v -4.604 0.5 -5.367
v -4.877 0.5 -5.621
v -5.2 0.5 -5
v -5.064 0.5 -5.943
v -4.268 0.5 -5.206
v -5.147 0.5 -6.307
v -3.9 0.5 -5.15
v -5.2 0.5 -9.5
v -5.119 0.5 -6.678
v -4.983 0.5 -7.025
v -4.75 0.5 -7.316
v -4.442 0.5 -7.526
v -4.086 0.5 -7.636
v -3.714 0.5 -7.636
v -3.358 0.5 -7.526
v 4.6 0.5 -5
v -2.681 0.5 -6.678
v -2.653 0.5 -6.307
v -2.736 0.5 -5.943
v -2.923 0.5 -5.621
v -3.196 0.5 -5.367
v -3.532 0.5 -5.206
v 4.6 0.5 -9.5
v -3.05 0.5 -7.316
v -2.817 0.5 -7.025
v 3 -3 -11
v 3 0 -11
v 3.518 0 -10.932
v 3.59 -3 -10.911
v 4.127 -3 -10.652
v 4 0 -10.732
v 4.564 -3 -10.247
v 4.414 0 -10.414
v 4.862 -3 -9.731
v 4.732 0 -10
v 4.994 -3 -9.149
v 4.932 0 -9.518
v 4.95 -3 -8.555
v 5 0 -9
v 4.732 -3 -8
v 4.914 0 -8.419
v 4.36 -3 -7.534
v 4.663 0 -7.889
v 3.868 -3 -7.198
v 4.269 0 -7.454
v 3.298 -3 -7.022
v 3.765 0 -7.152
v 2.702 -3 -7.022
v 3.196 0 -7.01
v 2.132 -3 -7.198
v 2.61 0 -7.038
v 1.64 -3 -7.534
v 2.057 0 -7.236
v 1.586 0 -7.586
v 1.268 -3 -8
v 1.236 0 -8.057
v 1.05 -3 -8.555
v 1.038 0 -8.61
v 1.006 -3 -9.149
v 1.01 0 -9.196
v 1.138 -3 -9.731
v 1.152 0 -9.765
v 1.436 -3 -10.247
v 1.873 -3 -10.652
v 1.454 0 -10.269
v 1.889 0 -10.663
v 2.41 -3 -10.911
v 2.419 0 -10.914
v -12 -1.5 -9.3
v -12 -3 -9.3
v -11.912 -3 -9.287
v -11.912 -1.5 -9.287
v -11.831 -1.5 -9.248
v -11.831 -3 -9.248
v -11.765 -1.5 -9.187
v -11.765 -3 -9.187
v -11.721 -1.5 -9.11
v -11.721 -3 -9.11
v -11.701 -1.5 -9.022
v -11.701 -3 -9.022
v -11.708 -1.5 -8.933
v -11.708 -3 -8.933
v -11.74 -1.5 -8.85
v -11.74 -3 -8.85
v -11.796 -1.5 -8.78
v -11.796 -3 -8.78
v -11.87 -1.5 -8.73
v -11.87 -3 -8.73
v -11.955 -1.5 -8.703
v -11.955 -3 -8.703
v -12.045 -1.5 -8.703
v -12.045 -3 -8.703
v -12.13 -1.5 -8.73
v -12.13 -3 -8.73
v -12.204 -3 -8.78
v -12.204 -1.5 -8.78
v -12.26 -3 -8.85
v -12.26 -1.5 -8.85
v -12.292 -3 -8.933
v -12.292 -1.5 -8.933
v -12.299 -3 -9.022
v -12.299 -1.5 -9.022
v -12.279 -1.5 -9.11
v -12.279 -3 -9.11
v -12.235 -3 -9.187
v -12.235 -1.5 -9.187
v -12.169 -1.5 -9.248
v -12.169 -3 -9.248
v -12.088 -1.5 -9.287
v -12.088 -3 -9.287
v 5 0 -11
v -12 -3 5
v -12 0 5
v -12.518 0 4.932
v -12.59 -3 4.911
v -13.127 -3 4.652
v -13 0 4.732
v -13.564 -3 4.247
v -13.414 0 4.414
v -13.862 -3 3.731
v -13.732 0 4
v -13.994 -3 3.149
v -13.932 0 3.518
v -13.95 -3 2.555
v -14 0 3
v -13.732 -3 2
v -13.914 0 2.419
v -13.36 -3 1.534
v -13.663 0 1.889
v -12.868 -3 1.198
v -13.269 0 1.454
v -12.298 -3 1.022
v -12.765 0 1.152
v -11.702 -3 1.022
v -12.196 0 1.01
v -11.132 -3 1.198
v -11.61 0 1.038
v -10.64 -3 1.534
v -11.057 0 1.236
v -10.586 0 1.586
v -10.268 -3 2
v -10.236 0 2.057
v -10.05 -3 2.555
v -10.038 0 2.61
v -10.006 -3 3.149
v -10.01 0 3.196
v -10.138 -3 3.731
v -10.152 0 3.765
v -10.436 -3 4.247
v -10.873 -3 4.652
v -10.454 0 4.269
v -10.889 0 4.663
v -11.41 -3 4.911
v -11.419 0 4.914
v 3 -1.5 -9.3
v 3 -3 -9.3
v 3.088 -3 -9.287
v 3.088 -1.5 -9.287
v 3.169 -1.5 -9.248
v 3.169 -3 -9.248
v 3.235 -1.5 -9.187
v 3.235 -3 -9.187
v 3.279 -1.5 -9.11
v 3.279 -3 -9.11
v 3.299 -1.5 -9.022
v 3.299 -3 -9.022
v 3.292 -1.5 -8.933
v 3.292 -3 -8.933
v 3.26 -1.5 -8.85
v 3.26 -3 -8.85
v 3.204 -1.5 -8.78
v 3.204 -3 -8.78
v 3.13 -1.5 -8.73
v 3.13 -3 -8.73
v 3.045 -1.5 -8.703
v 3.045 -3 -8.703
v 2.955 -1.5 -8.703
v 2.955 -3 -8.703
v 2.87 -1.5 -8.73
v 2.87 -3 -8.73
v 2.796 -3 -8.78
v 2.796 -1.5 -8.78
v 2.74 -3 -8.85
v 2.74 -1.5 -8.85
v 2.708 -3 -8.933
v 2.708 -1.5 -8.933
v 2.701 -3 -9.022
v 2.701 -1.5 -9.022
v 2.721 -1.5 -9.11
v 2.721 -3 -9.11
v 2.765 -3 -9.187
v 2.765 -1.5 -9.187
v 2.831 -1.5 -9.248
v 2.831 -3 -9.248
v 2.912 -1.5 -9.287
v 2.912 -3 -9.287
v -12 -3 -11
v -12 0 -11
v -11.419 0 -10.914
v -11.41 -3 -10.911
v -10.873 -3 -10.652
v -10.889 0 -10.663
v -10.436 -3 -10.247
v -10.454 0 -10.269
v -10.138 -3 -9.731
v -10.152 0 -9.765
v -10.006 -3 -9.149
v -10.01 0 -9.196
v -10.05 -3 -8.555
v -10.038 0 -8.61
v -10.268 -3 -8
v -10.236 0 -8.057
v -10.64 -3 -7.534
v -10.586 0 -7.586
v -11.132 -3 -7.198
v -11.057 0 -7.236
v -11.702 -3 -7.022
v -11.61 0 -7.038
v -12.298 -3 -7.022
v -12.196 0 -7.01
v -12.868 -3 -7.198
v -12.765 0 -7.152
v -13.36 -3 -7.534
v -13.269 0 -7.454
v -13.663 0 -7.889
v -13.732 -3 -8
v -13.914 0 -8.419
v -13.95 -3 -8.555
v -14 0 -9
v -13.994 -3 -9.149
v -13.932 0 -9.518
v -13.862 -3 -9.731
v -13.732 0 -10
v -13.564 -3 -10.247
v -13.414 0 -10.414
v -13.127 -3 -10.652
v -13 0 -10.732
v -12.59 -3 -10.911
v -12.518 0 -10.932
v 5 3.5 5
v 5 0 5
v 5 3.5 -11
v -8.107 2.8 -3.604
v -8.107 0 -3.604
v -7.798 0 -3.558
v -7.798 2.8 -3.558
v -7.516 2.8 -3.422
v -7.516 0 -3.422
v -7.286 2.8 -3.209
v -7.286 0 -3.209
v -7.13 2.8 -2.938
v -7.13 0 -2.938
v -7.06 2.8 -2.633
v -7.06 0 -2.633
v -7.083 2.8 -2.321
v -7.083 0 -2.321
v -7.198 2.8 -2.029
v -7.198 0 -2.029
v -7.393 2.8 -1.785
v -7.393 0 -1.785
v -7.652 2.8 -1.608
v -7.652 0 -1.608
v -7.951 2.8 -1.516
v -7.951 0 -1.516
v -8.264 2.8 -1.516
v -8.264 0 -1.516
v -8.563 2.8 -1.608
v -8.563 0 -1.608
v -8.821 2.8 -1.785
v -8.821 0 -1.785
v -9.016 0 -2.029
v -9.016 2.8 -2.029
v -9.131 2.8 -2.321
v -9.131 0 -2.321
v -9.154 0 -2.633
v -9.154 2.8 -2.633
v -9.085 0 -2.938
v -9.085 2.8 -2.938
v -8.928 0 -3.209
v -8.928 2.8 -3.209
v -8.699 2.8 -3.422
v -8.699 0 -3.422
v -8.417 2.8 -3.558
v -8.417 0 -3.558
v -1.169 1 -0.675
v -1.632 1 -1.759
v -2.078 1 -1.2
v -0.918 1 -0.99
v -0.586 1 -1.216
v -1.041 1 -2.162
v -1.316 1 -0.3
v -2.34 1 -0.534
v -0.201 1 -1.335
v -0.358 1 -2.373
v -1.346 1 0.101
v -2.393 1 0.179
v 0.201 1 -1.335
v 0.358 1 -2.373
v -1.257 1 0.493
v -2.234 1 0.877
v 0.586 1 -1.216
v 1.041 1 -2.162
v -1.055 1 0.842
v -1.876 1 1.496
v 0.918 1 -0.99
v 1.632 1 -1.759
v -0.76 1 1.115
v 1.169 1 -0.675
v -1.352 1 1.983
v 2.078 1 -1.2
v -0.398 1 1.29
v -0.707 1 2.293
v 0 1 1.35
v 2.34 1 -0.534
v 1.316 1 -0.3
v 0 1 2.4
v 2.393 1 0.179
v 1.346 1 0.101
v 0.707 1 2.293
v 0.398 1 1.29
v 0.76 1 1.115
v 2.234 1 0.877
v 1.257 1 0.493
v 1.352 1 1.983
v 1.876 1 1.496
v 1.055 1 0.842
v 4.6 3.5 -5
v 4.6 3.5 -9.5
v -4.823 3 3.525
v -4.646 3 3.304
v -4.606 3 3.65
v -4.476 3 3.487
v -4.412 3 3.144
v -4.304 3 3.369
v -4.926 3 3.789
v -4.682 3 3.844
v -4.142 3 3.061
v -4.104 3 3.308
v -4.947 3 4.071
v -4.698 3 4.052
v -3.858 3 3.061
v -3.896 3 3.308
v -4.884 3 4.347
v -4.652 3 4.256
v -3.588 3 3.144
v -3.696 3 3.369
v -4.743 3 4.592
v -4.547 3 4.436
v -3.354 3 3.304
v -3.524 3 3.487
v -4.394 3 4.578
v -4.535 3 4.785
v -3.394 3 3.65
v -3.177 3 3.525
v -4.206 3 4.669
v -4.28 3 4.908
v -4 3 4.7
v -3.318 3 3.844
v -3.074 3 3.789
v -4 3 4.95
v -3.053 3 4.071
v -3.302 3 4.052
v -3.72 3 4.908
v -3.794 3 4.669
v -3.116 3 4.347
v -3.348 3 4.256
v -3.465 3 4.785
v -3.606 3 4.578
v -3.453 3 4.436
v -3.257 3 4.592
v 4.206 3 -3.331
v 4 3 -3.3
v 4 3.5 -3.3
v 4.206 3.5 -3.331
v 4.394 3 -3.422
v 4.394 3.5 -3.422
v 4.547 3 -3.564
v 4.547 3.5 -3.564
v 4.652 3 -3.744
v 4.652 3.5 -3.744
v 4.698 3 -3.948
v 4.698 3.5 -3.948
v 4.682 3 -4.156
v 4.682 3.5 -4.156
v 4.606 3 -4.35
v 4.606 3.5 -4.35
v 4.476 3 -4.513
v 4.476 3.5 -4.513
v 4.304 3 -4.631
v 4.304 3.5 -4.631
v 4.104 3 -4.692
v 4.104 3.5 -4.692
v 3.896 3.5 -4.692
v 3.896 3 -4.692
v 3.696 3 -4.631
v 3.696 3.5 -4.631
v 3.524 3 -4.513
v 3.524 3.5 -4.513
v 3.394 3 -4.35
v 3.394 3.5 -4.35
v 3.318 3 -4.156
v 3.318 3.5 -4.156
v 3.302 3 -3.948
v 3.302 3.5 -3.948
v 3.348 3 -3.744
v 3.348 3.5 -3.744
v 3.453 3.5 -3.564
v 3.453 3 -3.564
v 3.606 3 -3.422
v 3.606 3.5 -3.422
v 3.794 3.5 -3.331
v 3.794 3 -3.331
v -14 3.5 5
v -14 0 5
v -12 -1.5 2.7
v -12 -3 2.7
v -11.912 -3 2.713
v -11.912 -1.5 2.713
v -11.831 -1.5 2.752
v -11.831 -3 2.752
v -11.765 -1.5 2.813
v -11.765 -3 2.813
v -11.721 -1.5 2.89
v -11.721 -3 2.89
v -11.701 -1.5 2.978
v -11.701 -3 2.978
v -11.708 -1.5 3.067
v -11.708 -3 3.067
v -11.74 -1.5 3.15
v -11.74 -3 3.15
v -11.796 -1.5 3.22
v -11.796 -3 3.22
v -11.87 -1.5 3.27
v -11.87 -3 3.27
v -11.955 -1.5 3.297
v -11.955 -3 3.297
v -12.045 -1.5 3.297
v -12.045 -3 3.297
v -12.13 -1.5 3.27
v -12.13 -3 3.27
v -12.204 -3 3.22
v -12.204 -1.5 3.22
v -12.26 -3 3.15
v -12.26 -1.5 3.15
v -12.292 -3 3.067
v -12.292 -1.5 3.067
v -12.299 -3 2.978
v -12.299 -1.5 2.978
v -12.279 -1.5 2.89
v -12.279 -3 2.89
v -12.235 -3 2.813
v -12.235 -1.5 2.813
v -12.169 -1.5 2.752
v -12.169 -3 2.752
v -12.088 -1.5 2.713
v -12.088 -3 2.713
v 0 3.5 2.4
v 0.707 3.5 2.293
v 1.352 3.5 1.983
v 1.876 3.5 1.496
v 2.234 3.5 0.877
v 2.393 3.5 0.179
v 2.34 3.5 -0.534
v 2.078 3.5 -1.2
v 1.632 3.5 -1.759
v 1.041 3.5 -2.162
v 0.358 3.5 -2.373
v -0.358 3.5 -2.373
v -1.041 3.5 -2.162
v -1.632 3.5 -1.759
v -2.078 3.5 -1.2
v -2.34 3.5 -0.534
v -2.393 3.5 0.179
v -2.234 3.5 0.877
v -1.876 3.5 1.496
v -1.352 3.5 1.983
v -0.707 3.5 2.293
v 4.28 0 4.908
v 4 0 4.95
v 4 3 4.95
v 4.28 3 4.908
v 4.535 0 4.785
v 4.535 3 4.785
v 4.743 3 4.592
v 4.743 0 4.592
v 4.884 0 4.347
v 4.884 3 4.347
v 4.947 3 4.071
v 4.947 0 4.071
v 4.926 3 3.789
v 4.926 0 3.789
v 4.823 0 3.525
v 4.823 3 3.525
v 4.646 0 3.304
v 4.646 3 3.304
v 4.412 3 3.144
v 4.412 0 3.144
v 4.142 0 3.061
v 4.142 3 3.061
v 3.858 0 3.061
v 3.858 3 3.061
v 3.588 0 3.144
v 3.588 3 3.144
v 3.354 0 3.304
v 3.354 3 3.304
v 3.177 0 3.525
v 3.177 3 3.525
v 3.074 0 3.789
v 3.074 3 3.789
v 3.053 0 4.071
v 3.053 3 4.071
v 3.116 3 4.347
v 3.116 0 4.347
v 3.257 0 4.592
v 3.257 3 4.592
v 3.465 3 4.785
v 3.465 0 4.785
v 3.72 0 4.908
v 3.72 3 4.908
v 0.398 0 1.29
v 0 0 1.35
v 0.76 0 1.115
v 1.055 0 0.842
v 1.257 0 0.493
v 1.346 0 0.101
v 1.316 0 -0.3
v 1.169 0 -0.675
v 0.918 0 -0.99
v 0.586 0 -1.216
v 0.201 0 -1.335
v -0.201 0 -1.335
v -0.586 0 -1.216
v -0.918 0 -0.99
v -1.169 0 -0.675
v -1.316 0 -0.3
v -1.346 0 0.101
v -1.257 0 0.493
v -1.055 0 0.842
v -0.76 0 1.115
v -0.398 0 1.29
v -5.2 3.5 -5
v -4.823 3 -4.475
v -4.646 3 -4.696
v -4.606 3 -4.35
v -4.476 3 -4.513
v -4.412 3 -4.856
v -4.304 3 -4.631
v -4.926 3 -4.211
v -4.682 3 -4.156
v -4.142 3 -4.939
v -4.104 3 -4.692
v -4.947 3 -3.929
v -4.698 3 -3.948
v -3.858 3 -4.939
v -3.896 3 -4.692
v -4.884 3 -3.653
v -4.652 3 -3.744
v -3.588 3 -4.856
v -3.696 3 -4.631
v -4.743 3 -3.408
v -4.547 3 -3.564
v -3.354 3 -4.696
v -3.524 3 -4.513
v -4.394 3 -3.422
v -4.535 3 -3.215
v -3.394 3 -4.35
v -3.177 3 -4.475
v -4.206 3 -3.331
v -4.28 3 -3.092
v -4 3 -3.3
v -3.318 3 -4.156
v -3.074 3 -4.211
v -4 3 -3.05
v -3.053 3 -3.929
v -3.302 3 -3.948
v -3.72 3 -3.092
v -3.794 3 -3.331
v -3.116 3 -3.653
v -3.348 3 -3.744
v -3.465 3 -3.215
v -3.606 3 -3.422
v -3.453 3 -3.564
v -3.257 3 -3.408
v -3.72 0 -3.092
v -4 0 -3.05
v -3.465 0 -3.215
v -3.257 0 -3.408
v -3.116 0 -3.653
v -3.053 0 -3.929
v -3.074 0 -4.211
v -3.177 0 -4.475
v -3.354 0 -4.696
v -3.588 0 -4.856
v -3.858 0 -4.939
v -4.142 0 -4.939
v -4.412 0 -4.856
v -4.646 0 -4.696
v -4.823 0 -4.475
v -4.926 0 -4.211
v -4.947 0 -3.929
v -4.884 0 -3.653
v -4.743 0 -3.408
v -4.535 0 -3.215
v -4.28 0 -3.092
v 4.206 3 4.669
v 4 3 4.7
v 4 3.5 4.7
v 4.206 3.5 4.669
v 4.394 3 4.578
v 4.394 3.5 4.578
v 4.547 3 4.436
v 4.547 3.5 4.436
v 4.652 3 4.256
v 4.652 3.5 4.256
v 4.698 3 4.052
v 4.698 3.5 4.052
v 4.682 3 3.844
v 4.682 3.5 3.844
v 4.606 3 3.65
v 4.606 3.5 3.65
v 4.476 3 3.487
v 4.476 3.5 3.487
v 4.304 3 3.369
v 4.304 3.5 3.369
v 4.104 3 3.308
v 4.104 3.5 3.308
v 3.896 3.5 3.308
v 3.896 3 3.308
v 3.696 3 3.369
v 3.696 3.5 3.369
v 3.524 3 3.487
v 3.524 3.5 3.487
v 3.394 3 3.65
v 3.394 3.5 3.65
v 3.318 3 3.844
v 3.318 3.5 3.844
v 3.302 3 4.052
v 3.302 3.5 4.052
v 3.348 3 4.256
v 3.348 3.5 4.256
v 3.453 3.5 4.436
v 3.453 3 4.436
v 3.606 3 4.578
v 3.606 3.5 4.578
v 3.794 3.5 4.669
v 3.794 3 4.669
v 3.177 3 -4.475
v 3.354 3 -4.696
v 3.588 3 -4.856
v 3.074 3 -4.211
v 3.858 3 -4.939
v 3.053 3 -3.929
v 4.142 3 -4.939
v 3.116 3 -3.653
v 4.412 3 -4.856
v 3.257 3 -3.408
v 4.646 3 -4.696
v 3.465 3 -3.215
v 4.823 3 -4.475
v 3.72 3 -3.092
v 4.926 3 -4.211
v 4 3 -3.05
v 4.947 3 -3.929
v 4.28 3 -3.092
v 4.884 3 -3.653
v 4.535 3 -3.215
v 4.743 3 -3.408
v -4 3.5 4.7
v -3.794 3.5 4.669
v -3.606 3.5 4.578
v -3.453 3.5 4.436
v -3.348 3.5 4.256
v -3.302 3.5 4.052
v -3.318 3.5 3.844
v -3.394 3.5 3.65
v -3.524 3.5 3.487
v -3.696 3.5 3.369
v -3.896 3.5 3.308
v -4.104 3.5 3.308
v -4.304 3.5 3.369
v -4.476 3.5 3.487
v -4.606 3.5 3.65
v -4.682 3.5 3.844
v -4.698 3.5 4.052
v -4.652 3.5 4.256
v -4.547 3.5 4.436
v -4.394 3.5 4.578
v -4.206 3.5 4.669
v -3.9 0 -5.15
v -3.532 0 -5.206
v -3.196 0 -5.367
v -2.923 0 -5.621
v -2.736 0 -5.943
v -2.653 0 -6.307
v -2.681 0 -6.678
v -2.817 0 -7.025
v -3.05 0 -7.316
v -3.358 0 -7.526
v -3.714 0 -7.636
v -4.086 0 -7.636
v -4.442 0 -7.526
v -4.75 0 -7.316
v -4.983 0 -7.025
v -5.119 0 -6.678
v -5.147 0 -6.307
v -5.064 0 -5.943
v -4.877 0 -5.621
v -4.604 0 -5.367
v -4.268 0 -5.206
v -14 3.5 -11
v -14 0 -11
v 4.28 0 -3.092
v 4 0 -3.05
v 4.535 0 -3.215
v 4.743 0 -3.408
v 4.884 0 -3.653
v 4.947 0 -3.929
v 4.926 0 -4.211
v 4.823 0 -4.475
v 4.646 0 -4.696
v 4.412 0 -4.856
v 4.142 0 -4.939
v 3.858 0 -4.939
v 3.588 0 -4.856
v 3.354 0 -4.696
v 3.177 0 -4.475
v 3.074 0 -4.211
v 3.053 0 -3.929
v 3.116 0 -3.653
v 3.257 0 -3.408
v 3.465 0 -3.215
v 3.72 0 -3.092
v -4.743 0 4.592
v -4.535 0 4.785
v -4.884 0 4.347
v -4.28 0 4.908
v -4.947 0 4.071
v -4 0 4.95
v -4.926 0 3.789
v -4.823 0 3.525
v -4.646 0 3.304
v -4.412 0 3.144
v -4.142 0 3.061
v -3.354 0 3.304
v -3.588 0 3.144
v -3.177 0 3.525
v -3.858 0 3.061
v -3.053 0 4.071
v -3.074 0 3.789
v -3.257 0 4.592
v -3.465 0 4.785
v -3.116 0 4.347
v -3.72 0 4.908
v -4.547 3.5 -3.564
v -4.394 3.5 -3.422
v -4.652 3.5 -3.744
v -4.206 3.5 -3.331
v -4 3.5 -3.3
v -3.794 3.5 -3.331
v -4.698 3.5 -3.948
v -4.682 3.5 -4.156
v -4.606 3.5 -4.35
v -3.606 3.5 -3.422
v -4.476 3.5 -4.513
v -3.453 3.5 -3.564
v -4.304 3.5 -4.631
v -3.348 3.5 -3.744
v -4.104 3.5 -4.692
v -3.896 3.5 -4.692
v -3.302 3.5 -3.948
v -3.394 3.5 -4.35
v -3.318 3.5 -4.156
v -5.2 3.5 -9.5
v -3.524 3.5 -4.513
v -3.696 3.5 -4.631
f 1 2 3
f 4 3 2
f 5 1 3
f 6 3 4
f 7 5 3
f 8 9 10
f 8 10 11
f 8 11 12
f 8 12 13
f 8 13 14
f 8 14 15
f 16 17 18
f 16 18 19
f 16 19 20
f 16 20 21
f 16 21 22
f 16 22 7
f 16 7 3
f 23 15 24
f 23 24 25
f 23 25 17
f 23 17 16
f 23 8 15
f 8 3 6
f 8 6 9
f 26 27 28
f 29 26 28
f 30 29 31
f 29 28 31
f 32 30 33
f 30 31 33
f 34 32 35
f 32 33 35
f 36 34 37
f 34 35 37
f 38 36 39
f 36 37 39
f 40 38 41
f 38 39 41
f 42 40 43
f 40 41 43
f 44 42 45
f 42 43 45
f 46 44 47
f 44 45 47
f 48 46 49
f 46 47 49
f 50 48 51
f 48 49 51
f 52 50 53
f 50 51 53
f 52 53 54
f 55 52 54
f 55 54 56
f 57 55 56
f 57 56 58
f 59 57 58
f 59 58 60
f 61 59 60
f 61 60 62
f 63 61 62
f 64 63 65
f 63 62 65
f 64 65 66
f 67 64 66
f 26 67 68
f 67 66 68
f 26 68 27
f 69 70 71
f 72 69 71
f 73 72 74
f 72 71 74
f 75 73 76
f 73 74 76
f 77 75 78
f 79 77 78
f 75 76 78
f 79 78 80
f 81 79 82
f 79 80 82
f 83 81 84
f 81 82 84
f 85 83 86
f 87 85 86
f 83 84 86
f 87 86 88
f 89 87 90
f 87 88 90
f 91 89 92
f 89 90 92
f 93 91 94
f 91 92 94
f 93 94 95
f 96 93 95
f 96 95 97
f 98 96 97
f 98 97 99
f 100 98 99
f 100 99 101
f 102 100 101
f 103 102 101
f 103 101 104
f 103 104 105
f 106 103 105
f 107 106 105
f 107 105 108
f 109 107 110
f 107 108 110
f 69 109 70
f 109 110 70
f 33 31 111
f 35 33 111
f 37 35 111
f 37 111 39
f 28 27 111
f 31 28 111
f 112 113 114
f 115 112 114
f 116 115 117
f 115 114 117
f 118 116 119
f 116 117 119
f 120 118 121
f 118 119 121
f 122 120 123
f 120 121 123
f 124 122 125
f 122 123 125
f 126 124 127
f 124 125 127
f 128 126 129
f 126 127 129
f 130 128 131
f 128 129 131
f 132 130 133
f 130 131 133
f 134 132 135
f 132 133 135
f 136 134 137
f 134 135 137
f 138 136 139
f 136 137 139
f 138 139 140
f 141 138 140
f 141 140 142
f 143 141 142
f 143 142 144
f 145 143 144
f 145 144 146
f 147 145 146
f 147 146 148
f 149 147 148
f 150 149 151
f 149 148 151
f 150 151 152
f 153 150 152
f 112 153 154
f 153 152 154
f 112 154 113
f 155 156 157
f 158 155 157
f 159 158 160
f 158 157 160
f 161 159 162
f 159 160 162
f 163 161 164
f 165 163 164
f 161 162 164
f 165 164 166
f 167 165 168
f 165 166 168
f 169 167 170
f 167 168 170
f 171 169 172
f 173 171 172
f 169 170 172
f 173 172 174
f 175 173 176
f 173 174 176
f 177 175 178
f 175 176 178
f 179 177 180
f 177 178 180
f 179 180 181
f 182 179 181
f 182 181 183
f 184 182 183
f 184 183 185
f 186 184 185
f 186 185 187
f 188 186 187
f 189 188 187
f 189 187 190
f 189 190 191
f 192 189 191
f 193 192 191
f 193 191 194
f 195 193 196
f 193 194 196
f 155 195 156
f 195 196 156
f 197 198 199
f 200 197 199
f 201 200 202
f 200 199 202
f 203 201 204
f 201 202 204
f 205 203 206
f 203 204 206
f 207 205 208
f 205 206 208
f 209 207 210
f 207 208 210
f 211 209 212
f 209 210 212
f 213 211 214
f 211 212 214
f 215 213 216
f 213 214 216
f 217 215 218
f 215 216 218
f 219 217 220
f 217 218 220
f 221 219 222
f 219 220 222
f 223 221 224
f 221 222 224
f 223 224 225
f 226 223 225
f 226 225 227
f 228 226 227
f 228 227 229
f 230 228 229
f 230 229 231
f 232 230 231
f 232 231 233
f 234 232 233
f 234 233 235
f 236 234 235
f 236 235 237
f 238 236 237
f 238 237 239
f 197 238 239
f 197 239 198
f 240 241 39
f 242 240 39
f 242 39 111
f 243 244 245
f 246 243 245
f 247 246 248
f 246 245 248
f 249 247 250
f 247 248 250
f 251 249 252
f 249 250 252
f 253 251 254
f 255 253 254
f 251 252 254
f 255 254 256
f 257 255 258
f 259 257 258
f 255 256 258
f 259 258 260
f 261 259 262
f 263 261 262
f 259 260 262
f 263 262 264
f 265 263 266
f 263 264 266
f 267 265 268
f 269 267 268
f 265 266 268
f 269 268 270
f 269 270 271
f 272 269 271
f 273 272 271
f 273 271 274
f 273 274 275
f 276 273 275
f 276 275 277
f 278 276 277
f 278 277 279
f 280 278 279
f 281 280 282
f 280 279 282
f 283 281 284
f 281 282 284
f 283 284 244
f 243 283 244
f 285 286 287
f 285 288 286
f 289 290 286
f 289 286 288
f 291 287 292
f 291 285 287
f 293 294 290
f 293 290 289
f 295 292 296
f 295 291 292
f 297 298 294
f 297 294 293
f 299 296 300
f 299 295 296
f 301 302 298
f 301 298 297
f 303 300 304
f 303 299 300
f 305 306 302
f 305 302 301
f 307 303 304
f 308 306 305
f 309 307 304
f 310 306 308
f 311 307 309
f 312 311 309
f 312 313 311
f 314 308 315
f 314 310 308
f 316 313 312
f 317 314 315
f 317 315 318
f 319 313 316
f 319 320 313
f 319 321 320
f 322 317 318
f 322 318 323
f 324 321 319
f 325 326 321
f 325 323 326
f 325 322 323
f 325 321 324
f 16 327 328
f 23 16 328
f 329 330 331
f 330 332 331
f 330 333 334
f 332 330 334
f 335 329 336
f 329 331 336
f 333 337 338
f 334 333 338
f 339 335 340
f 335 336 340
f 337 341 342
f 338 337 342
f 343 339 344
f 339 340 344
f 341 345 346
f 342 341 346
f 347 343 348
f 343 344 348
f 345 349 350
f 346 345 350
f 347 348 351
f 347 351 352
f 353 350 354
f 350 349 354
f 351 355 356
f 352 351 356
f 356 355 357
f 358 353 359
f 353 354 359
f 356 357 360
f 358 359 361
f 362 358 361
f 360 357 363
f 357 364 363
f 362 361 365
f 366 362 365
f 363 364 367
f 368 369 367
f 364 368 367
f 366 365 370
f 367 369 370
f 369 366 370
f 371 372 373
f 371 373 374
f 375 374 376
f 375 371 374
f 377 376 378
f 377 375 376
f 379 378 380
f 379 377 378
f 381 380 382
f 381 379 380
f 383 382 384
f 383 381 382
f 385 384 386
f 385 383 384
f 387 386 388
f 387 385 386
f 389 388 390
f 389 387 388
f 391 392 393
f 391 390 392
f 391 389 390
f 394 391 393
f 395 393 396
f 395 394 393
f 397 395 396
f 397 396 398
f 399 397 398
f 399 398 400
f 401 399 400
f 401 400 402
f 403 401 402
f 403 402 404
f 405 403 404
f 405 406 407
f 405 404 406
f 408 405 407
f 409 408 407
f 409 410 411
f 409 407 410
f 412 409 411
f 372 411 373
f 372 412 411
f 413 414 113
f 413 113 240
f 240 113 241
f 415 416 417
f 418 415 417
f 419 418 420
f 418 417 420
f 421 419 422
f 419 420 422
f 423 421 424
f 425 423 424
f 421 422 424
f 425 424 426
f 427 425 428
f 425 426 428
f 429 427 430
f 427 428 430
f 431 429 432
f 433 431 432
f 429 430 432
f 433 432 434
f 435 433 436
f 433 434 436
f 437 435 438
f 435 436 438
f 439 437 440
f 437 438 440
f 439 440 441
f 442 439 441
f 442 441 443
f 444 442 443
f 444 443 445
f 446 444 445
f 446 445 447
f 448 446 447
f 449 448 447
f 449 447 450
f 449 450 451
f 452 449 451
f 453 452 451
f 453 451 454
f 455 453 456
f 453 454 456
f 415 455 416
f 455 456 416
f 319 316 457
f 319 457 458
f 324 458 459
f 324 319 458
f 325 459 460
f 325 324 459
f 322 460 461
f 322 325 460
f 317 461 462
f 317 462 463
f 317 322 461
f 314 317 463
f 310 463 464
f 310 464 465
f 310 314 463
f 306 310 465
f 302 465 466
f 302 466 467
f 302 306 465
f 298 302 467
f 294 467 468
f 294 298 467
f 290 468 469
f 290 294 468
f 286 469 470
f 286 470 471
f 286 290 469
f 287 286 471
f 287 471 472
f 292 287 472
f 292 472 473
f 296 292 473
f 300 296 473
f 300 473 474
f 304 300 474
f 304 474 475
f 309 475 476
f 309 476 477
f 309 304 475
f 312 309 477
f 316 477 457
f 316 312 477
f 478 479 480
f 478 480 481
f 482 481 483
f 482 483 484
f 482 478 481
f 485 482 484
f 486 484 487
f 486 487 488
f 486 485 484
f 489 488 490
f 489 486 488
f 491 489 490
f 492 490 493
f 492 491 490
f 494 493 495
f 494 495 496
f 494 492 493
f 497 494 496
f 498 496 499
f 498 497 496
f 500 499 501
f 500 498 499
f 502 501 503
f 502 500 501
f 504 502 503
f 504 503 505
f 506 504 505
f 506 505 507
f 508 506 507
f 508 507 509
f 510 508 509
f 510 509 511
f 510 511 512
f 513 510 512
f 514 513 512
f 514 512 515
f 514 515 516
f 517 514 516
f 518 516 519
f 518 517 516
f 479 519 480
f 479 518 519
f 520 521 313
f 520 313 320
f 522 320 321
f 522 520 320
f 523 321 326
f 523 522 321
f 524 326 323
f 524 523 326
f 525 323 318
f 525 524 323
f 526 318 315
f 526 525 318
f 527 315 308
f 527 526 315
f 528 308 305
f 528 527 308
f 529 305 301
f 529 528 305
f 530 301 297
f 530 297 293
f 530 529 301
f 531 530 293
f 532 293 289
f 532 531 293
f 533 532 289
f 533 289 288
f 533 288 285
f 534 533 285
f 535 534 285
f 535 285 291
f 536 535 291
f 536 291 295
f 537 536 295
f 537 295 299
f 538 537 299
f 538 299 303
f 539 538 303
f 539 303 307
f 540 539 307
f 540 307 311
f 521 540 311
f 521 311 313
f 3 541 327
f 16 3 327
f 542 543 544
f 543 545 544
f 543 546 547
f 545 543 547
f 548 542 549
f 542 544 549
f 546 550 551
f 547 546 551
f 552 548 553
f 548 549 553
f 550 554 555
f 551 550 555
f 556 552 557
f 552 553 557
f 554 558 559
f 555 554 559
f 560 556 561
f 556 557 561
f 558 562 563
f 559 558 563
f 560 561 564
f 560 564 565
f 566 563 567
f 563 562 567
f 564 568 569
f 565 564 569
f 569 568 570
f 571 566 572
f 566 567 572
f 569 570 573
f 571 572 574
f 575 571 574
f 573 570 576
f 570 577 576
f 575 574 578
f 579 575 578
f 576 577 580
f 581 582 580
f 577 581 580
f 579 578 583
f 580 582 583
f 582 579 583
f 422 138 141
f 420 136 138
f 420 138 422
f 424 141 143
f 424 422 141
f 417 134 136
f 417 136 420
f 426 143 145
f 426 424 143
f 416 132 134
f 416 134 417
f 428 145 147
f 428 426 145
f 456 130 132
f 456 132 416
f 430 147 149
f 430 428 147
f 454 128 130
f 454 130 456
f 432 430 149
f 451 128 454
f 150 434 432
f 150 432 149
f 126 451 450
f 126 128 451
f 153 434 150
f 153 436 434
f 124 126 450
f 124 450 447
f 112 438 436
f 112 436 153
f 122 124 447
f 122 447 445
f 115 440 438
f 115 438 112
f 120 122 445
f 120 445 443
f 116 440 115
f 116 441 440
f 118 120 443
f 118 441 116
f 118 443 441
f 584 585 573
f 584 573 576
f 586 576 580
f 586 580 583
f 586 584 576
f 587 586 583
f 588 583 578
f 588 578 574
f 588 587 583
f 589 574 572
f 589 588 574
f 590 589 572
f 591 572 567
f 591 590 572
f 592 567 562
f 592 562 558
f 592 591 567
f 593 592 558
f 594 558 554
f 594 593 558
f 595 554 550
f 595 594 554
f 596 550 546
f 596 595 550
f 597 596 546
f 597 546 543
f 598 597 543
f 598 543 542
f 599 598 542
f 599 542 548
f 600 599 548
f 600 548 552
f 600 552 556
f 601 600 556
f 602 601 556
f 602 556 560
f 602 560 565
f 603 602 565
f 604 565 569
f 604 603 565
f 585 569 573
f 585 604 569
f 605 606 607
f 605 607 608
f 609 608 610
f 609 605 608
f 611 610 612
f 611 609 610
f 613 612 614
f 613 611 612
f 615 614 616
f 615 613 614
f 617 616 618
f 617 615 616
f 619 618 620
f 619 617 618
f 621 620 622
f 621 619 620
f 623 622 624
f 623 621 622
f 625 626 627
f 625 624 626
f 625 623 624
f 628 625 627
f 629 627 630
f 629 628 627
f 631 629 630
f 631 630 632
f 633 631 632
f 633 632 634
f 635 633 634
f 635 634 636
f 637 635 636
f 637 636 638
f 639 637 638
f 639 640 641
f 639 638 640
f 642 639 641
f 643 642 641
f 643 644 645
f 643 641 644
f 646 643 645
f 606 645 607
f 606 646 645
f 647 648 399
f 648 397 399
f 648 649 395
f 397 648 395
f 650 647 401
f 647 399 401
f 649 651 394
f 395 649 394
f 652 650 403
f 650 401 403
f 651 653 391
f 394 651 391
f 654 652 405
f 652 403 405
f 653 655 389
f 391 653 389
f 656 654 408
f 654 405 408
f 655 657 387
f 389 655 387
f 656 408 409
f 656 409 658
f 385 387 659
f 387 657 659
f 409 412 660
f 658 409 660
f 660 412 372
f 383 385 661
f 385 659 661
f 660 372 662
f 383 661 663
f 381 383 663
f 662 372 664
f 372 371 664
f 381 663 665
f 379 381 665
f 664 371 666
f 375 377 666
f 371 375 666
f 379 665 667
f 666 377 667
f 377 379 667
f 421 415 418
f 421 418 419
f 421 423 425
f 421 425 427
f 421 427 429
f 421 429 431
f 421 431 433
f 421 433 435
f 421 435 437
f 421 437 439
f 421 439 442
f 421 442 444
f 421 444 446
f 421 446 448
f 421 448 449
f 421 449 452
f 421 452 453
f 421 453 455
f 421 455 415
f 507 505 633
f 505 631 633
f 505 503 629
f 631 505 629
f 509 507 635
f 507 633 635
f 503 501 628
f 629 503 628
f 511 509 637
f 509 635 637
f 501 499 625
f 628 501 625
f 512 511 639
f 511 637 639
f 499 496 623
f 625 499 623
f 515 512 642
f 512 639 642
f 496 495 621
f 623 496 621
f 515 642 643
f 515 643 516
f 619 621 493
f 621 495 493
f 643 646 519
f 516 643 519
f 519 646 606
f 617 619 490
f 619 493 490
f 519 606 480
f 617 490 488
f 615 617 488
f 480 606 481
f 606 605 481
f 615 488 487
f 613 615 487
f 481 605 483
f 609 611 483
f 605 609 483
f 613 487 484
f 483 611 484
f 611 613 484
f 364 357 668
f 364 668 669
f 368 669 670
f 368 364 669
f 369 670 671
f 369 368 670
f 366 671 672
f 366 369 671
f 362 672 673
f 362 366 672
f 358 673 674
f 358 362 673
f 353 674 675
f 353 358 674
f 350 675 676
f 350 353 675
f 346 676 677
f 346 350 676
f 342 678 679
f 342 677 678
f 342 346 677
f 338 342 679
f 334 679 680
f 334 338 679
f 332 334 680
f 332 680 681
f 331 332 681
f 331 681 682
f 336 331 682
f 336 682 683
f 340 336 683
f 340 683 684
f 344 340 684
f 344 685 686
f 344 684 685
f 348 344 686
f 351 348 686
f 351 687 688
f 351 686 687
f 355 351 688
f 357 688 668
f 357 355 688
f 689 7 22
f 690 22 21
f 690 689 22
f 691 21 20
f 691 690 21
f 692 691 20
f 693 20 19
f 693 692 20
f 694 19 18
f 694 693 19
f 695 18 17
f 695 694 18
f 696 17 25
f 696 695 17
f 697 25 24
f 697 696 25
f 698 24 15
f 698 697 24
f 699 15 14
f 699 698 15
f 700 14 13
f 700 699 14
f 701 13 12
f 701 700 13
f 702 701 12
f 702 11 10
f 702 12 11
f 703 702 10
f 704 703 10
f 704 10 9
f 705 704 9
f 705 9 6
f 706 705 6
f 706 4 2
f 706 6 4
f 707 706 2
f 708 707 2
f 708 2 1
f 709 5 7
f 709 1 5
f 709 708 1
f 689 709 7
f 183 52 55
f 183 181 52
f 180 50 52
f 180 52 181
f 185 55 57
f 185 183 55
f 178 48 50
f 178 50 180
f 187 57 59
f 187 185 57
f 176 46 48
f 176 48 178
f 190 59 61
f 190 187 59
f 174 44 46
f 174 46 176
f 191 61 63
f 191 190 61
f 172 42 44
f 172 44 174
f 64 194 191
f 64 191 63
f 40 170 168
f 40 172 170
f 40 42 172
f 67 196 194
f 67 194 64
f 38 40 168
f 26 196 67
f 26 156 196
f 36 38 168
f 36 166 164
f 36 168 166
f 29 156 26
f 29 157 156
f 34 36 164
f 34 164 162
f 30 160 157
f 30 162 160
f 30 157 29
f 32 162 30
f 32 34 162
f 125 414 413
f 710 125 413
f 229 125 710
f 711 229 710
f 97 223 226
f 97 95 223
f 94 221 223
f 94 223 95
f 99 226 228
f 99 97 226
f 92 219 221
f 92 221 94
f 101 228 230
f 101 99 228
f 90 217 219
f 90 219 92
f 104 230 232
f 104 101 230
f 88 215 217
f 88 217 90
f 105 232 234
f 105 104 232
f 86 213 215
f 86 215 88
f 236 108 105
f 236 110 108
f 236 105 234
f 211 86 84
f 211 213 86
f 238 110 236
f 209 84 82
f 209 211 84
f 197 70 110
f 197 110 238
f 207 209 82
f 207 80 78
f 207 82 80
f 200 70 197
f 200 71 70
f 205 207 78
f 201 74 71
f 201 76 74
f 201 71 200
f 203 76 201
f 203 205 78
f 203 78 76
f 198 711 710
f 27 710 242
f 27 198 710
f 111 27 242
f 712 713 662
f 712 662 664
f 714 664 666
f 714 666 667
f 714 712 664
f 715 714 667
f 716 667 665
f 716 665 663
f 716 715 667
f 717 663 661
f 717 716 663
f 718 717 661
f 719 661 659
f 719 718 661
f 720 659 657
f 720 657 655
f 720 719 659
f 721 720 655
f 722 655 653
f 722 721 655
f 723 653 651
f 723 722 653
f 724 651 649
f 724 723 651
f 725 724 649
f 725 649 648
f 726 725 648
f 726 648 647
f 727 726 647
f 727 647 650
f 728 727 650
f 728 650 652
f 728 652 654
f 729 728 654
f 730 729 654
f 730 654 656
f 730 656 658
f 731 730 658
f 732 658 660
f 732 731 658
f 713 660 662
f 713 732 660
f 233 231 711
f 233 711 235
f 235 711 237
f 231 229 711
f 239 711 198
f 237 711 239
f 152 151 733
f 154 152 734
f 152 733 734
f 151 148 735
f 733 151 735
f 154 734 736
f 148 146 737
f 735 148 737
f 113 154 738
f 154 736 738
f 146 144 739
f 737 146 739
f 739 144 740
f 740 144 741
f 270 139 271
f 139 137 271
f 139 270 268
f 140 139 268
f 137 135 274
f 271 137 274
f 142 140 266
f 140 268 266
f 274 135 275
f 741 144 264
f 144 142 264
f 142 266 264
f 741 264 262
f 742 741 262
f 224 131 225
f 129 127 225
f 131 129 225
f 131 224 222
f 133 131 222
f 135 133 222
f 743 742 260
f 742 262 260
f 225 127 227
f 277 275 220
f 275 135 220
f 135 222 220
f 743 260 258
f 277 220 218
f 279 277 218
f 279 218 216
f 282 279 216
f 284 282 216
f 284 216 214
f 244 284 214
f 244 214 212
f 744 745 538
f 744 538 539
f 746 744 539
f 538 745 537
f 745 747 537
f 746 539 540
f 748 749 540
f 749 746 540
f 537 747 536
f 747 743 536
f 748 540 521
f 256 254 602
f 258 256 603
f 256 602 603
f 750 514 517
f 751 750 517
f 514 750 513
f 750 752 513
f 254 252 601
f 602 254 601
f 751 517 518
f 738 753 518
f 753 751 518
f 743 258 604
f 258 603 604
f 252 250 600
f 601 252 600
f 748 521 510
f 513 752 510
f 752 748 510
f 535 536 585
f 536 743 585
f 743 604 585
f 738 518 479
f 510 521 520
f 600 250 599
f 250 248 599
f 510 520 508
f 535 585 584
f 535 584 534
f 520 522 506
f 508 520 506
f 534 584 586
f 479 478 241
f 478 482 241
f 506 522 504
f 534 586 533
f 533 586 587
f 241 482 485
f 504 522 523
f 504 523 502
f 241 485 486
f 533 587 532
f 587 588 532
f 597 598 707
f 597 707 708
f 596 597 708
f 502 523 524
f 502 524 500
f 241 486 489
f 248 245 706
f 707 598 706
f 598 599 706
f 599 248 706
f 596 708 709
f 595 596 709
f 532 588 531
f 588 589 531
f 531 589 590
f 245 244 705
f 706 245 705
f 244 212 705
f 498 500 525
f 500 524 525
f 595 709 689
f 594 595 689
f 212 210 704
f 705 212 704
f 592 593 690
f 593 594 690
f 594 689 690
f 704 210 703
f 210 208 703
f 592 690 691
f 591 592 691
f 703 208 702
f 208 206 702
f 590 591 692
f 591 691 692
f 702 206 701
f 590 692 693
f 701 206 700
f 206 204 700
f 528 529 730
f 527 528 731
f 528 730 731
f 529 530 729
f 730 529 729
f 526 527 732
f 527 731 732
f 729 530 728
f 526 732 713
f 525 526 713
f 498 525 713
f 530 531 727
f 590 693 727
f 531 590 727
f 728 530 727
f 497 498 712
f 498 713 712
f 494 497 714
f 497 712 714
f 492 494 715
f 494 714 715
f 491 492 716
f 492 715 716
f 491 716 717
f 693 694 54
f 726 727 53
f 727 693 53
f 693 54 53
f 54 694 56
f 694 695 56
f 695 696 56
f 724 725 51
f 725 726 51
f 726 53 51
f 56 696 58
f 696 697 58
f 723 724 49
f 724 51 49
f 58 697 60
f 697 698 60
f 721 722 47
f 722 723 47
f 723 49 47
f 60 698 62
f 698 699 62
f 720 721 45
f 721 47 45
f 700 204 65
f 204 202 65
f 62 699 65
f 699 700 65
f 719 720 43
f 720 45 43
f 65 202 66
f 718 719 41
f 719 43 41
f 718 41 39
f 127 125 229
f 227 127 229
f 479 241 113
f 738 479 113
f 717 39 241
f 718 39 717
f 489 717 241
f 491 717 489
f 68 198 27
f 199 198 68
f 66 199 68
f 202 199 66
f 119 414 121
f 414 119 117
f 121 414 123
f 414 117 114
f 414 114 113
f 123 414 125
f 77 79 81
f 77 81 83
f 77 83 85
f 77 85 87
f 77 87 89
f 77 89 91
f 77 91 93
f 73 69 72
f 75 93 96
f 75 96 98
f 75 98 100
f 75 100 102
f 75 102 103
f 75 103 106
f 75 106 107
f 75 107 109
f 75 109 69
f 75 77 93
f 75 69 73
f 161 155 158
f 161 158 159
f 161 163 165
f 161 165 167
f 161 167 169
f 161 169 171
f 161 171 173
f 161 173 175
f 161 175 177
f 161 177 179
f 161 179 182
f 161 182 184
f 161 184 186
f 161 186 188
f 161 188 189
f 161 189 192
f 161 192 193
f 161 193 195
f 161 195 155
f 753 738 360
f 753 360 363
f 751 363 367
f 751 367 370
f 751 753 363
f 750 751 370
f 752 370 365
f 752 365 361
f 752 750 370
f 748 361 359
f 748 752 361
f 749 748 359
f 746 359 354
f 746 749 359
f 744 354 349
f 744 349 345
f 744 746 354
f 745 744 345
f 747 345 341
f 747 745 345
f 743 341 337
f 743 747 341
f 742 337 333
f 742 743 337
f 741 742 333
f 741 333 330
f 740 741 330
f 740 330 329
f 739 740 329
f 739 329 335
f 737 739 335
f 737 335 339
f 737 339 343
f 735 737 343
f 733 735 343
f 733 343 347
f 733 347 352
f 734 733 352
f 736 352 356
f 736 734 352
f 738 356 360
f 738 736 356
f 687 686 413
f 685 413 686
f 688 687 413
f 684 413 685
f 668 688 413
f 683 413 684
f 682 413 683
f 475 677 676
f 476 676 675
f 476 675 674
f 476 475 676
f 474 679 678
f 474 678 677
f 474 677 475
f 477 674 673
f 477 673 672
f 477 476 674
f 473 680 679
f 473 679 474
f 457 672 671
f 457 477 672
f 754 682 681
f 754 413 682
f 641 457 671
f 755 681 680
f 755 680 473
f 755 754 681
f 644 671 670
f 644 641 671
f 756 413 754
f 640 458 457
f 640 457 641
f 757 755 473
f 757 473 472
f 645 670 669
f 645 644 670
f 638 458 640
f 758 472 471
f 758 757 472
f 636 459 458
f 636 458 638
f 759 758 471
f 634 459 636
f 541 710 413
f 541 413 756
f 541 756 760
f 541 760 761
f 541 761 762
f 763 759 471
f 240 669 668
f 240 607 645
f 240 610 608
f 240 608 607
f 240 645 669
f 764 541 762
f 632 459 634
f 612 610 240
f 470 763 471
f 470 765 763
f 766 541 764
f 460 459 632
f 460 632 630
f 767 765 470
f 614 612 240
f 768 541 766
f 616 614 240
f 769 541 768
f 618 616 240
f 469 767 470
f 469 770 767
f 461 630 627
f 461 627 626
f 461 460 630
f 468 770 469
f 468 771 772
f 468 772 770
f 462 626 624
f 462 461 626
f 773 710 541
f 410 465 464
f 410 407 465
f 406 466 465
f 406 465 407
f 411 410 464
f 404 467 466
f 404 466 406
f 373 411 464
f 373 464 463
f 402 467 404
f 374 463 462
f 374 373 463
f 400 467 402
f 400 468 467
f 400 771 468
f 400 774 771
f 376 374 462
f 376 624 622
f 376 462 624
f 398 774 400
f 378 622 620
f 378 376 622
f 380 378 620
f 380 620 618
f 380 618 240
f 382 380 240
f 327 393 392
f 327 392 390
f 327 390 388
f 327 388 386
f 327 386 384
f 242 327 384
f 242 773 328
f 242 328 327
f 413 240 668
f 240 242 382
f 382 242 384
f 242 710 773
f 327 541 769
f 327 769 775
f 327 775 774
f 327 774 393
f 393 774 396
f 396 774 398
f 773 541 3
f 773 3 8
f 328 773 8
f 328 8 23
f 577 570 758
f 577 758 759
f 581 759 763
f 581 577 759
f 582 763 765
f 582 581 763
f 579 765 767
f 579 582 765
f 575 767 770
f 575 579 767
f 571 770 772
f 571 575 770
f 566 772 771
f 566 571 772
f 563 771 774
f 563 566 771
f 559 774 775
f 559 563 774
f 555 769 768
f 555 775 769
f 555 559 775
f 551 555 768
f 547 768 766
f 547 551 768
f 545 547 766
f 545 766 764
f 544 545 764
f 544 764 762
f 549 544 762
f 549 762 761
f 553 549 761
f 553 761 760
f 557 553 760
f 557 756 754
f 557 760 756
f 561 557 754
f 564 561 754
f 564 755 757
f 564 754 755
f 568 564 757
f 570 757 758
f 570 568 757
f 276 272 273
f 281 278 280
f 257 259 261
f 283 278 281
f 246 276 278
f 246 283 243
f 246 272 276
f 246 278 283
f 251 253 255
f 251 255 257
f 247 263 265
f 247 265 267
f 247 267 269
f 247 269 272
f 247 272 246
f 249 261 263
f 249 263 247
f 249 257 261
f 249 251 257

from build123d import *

# Parameters (mm, degrees)
SKETCH_1_W          = 19
SKETCH_1_H          = 16
EXTRUDE_1_DEPTH     = 3.5
SKETCH_1_3_R        = 1.35
CUT_EXTRUDE_1_DEPTH = 19.145247312
CUT_EXTRUDE_START   = 1
SKETCH_1_4_R        = 2.4
SKETCH_1_4_R_2      = 1.35
CUT_EXTRUDE_2_DEPTH = 2.5
SKETCH_1_7_R        = 0.7
CUT_EXTRUDE_3_DEPTH = 19.145247312
SKETCH_1_18_R       = 0.95
CUT_EXTRUDE_8_DEPTH = 3
SKETCH_1_17_R       = 1.25
CUT_EXTRUDE_4_DEPTH = 19.145247312
SKETCH_2_W          = 9.8
SKETCH_2_H          = 4.5
CUT_EXTRUDE_5_DEPTH = 3
SKETCH_4_R          = 1.05
CUT_EXTRUDE_6_DEPTH = 2.8
SKETCH_5_R          = 2
EXTRUDE_2_DEPTH     = 3
CUT_EXTRUDE_START_2 = 3
SKETCH_5_3_R        = 0.3
CUT_EXTRUDE_7_DEPTH = 1.5


with BuildPart() as part:
    # 草图1 → 凸台-拉伸1 (new body)
    with BuildSketch(Plane(origin=(0, 0, 0), x_dir=(1, 0, 0), z_dir=(0, 1, 0))):
        with Locations((-4.5, 3)):
            Rectangle(SKETCH_1_W, SKETCH_1_H)
    extrude(amount=EXTRUDE_1_DEPTH)

    # 草图1<3> → 切除-拉伸1 (cut, through all)
    with BuildSketch(Plane(origin=(0, 0, 0), x_dir=(1, 0, 0), z_dir=(0, 1, 0))):
        with Locations(Location((0, 0, 0), (0, 0, 270))):
            Circle(SKETCH_1_3_R)
    extrude(amount=CUT_EXTRUDE_1_DEPTH, mode=Mode.SUBTRACT)

    # 草图1<4> → 切除-拉伸2 (cut)
    with BuildSketch(Plane(origin=(0, 0, 0), x_dir=(1, 0, 0), z_dir=(0, 1, 0)).offset(CUT_EXTRUDE_START)):
        with Locations(Location((0, 0, 0), (0, 0, 270))):
            Circle(SKETCH_1_4_R)
        with Locations(Location((0, 0, 0), (0, 0, 270))):
            Circle(SKETCH_1_4_R_2, mode=Mode.SUBTRACT)
    extrude(amount=CUT_EXTRUDE_2_DEPTH, mode=Mode.SUBTRACT)

    # 草图1<7> → 切除-拉伸3 (cut, through all)
    with BuildSketch(Plane(origin=(0, 0, 0), x_dir=(1, 0, 0), z_dir=(0, 1, 0))):
        with Locations(Location((4, 4, 0), (0, 0, 270))):
            Circle(SKETCH_1_7_R)
        with Locations(Location((-4, -4, 0), (0, 0, 270))):
            Circle(SKETCH_1_7_R)
        with Locations(Location((-4, 4, 0), (0, 0, 270))):
            Circle(SKETCH_1_7_R)
        with Locations(Location((4, -4, 0), (0, 0, 270))):
            Circle(SKETCH_1_7_R)
    extrude(amount=CUT_EXTRUDE_3_DEPTH, mode=Mode.SUBTRACT)

    # 草图1<18> → 切除-拉伸8 (cut)
    with BuildSketch(Plane(origin=(0, 0, 0), x_dir=(1, 0, 0), z_dir=(0, 1, 0))):
        with Locations(Location((4, 4, 0), (0, 0, 270))):
            Circle(SKETCH_1_18_R)
        with Locations(Location((-4, -4, 0), (0, 0, 270))):
            Circle(SKETCH_1_18_R)
        with Locations(Location((-4, 4, 0), (0, 0, 270))):
            Circle(SKETCH_1_18_R)
        with Locations(Location((4, -4, 0), (0, 0, 270))):
            Circle(SKETCH_1_18_R)
    extrude(amount=CUT_EXTRUDE_8_DEPTH, mode=Mode.SUBTRACT)

    # 草图1<17> → 切除-拉伸4 (cut, through all)
    with BuildSketch(Plane(origin=(0, 0, 0), x_dir=(1, 0, 0), z_dir=(0, 1, 0))):
        with Locations(Location((-3.9, 6.4, 0), (0, 0, 270))):
            Circle(SKETCH_1_17_R)
    extrude(amount=CUT_EXTRUDE_4_DEPTH, mode=Mode.SUBTRACT)

    # 草图2 → 切除-拉伸5 (cut)
    with BuildSketch(Plane(origin=(0, 3.5, 0), x_dir=(1, 0, 0), z_dir=(0, 1, 0))):
        with Locations((-0.3, 7.25)):
            Rectangle(SKETCH_2_W, SKETCH_2_H)
    extrude(amount=-CUT_EXTRUDE_5_DEPTH, mode=Mode.SUBTRACT)

    # 草图4 → 切除-拉伸6 (cut)
    with BuildSketch(Plane.XZ):
        with Locations(Location((-8.107149516, -2.554237014, 0), (0, 0, 270))):
            Circle(SKETCH_4_R)
    extrude(amount=-CUT_EXTRUDE_6_DEPTH, mode=Mode.SUBTRACT)

    # 草图5 → 凸台-拉伸2 (add)
    with BuildSketch(Plane.XZ):
        with Locations(Location((-12, 3, 0), (0, 0, 90))):
            Circle(SKETCH_5_R)
        with Locations(Location((-12, -9, 0), (0, 0, 270))):
            Circle(SKETCH_5_R)
        with Locations(Location((3, -9, 0), (0, 0, 270))):
            Circle(SKETCH_5_R)
    extrude(amount=EXTRUDE_2_DEPTH)

    # 草图5<3> → 切除-拉伸7 (cut)
    with BuildSketch(Plane.XZ.offset(CUT_EXTRUDE_START_2)):
        with Locations(Location((3, -9, 0), (0, 0, 270))):
            Circle(SKETCH_5_3_R)
        with Locations(Location((-12, -9, 0), (0, 0, 270))):
            Circle(SKETCH_5_3_R)
        with Locations(Location((-12, 3, 0), (0, 0, 270))):
            Circle(SKETCH_5_3_R)
    extrude(amount=-CUT_EXTRUDE_7_DEPTH, mode=Mode.SUBTRACT)


solid = part.part
